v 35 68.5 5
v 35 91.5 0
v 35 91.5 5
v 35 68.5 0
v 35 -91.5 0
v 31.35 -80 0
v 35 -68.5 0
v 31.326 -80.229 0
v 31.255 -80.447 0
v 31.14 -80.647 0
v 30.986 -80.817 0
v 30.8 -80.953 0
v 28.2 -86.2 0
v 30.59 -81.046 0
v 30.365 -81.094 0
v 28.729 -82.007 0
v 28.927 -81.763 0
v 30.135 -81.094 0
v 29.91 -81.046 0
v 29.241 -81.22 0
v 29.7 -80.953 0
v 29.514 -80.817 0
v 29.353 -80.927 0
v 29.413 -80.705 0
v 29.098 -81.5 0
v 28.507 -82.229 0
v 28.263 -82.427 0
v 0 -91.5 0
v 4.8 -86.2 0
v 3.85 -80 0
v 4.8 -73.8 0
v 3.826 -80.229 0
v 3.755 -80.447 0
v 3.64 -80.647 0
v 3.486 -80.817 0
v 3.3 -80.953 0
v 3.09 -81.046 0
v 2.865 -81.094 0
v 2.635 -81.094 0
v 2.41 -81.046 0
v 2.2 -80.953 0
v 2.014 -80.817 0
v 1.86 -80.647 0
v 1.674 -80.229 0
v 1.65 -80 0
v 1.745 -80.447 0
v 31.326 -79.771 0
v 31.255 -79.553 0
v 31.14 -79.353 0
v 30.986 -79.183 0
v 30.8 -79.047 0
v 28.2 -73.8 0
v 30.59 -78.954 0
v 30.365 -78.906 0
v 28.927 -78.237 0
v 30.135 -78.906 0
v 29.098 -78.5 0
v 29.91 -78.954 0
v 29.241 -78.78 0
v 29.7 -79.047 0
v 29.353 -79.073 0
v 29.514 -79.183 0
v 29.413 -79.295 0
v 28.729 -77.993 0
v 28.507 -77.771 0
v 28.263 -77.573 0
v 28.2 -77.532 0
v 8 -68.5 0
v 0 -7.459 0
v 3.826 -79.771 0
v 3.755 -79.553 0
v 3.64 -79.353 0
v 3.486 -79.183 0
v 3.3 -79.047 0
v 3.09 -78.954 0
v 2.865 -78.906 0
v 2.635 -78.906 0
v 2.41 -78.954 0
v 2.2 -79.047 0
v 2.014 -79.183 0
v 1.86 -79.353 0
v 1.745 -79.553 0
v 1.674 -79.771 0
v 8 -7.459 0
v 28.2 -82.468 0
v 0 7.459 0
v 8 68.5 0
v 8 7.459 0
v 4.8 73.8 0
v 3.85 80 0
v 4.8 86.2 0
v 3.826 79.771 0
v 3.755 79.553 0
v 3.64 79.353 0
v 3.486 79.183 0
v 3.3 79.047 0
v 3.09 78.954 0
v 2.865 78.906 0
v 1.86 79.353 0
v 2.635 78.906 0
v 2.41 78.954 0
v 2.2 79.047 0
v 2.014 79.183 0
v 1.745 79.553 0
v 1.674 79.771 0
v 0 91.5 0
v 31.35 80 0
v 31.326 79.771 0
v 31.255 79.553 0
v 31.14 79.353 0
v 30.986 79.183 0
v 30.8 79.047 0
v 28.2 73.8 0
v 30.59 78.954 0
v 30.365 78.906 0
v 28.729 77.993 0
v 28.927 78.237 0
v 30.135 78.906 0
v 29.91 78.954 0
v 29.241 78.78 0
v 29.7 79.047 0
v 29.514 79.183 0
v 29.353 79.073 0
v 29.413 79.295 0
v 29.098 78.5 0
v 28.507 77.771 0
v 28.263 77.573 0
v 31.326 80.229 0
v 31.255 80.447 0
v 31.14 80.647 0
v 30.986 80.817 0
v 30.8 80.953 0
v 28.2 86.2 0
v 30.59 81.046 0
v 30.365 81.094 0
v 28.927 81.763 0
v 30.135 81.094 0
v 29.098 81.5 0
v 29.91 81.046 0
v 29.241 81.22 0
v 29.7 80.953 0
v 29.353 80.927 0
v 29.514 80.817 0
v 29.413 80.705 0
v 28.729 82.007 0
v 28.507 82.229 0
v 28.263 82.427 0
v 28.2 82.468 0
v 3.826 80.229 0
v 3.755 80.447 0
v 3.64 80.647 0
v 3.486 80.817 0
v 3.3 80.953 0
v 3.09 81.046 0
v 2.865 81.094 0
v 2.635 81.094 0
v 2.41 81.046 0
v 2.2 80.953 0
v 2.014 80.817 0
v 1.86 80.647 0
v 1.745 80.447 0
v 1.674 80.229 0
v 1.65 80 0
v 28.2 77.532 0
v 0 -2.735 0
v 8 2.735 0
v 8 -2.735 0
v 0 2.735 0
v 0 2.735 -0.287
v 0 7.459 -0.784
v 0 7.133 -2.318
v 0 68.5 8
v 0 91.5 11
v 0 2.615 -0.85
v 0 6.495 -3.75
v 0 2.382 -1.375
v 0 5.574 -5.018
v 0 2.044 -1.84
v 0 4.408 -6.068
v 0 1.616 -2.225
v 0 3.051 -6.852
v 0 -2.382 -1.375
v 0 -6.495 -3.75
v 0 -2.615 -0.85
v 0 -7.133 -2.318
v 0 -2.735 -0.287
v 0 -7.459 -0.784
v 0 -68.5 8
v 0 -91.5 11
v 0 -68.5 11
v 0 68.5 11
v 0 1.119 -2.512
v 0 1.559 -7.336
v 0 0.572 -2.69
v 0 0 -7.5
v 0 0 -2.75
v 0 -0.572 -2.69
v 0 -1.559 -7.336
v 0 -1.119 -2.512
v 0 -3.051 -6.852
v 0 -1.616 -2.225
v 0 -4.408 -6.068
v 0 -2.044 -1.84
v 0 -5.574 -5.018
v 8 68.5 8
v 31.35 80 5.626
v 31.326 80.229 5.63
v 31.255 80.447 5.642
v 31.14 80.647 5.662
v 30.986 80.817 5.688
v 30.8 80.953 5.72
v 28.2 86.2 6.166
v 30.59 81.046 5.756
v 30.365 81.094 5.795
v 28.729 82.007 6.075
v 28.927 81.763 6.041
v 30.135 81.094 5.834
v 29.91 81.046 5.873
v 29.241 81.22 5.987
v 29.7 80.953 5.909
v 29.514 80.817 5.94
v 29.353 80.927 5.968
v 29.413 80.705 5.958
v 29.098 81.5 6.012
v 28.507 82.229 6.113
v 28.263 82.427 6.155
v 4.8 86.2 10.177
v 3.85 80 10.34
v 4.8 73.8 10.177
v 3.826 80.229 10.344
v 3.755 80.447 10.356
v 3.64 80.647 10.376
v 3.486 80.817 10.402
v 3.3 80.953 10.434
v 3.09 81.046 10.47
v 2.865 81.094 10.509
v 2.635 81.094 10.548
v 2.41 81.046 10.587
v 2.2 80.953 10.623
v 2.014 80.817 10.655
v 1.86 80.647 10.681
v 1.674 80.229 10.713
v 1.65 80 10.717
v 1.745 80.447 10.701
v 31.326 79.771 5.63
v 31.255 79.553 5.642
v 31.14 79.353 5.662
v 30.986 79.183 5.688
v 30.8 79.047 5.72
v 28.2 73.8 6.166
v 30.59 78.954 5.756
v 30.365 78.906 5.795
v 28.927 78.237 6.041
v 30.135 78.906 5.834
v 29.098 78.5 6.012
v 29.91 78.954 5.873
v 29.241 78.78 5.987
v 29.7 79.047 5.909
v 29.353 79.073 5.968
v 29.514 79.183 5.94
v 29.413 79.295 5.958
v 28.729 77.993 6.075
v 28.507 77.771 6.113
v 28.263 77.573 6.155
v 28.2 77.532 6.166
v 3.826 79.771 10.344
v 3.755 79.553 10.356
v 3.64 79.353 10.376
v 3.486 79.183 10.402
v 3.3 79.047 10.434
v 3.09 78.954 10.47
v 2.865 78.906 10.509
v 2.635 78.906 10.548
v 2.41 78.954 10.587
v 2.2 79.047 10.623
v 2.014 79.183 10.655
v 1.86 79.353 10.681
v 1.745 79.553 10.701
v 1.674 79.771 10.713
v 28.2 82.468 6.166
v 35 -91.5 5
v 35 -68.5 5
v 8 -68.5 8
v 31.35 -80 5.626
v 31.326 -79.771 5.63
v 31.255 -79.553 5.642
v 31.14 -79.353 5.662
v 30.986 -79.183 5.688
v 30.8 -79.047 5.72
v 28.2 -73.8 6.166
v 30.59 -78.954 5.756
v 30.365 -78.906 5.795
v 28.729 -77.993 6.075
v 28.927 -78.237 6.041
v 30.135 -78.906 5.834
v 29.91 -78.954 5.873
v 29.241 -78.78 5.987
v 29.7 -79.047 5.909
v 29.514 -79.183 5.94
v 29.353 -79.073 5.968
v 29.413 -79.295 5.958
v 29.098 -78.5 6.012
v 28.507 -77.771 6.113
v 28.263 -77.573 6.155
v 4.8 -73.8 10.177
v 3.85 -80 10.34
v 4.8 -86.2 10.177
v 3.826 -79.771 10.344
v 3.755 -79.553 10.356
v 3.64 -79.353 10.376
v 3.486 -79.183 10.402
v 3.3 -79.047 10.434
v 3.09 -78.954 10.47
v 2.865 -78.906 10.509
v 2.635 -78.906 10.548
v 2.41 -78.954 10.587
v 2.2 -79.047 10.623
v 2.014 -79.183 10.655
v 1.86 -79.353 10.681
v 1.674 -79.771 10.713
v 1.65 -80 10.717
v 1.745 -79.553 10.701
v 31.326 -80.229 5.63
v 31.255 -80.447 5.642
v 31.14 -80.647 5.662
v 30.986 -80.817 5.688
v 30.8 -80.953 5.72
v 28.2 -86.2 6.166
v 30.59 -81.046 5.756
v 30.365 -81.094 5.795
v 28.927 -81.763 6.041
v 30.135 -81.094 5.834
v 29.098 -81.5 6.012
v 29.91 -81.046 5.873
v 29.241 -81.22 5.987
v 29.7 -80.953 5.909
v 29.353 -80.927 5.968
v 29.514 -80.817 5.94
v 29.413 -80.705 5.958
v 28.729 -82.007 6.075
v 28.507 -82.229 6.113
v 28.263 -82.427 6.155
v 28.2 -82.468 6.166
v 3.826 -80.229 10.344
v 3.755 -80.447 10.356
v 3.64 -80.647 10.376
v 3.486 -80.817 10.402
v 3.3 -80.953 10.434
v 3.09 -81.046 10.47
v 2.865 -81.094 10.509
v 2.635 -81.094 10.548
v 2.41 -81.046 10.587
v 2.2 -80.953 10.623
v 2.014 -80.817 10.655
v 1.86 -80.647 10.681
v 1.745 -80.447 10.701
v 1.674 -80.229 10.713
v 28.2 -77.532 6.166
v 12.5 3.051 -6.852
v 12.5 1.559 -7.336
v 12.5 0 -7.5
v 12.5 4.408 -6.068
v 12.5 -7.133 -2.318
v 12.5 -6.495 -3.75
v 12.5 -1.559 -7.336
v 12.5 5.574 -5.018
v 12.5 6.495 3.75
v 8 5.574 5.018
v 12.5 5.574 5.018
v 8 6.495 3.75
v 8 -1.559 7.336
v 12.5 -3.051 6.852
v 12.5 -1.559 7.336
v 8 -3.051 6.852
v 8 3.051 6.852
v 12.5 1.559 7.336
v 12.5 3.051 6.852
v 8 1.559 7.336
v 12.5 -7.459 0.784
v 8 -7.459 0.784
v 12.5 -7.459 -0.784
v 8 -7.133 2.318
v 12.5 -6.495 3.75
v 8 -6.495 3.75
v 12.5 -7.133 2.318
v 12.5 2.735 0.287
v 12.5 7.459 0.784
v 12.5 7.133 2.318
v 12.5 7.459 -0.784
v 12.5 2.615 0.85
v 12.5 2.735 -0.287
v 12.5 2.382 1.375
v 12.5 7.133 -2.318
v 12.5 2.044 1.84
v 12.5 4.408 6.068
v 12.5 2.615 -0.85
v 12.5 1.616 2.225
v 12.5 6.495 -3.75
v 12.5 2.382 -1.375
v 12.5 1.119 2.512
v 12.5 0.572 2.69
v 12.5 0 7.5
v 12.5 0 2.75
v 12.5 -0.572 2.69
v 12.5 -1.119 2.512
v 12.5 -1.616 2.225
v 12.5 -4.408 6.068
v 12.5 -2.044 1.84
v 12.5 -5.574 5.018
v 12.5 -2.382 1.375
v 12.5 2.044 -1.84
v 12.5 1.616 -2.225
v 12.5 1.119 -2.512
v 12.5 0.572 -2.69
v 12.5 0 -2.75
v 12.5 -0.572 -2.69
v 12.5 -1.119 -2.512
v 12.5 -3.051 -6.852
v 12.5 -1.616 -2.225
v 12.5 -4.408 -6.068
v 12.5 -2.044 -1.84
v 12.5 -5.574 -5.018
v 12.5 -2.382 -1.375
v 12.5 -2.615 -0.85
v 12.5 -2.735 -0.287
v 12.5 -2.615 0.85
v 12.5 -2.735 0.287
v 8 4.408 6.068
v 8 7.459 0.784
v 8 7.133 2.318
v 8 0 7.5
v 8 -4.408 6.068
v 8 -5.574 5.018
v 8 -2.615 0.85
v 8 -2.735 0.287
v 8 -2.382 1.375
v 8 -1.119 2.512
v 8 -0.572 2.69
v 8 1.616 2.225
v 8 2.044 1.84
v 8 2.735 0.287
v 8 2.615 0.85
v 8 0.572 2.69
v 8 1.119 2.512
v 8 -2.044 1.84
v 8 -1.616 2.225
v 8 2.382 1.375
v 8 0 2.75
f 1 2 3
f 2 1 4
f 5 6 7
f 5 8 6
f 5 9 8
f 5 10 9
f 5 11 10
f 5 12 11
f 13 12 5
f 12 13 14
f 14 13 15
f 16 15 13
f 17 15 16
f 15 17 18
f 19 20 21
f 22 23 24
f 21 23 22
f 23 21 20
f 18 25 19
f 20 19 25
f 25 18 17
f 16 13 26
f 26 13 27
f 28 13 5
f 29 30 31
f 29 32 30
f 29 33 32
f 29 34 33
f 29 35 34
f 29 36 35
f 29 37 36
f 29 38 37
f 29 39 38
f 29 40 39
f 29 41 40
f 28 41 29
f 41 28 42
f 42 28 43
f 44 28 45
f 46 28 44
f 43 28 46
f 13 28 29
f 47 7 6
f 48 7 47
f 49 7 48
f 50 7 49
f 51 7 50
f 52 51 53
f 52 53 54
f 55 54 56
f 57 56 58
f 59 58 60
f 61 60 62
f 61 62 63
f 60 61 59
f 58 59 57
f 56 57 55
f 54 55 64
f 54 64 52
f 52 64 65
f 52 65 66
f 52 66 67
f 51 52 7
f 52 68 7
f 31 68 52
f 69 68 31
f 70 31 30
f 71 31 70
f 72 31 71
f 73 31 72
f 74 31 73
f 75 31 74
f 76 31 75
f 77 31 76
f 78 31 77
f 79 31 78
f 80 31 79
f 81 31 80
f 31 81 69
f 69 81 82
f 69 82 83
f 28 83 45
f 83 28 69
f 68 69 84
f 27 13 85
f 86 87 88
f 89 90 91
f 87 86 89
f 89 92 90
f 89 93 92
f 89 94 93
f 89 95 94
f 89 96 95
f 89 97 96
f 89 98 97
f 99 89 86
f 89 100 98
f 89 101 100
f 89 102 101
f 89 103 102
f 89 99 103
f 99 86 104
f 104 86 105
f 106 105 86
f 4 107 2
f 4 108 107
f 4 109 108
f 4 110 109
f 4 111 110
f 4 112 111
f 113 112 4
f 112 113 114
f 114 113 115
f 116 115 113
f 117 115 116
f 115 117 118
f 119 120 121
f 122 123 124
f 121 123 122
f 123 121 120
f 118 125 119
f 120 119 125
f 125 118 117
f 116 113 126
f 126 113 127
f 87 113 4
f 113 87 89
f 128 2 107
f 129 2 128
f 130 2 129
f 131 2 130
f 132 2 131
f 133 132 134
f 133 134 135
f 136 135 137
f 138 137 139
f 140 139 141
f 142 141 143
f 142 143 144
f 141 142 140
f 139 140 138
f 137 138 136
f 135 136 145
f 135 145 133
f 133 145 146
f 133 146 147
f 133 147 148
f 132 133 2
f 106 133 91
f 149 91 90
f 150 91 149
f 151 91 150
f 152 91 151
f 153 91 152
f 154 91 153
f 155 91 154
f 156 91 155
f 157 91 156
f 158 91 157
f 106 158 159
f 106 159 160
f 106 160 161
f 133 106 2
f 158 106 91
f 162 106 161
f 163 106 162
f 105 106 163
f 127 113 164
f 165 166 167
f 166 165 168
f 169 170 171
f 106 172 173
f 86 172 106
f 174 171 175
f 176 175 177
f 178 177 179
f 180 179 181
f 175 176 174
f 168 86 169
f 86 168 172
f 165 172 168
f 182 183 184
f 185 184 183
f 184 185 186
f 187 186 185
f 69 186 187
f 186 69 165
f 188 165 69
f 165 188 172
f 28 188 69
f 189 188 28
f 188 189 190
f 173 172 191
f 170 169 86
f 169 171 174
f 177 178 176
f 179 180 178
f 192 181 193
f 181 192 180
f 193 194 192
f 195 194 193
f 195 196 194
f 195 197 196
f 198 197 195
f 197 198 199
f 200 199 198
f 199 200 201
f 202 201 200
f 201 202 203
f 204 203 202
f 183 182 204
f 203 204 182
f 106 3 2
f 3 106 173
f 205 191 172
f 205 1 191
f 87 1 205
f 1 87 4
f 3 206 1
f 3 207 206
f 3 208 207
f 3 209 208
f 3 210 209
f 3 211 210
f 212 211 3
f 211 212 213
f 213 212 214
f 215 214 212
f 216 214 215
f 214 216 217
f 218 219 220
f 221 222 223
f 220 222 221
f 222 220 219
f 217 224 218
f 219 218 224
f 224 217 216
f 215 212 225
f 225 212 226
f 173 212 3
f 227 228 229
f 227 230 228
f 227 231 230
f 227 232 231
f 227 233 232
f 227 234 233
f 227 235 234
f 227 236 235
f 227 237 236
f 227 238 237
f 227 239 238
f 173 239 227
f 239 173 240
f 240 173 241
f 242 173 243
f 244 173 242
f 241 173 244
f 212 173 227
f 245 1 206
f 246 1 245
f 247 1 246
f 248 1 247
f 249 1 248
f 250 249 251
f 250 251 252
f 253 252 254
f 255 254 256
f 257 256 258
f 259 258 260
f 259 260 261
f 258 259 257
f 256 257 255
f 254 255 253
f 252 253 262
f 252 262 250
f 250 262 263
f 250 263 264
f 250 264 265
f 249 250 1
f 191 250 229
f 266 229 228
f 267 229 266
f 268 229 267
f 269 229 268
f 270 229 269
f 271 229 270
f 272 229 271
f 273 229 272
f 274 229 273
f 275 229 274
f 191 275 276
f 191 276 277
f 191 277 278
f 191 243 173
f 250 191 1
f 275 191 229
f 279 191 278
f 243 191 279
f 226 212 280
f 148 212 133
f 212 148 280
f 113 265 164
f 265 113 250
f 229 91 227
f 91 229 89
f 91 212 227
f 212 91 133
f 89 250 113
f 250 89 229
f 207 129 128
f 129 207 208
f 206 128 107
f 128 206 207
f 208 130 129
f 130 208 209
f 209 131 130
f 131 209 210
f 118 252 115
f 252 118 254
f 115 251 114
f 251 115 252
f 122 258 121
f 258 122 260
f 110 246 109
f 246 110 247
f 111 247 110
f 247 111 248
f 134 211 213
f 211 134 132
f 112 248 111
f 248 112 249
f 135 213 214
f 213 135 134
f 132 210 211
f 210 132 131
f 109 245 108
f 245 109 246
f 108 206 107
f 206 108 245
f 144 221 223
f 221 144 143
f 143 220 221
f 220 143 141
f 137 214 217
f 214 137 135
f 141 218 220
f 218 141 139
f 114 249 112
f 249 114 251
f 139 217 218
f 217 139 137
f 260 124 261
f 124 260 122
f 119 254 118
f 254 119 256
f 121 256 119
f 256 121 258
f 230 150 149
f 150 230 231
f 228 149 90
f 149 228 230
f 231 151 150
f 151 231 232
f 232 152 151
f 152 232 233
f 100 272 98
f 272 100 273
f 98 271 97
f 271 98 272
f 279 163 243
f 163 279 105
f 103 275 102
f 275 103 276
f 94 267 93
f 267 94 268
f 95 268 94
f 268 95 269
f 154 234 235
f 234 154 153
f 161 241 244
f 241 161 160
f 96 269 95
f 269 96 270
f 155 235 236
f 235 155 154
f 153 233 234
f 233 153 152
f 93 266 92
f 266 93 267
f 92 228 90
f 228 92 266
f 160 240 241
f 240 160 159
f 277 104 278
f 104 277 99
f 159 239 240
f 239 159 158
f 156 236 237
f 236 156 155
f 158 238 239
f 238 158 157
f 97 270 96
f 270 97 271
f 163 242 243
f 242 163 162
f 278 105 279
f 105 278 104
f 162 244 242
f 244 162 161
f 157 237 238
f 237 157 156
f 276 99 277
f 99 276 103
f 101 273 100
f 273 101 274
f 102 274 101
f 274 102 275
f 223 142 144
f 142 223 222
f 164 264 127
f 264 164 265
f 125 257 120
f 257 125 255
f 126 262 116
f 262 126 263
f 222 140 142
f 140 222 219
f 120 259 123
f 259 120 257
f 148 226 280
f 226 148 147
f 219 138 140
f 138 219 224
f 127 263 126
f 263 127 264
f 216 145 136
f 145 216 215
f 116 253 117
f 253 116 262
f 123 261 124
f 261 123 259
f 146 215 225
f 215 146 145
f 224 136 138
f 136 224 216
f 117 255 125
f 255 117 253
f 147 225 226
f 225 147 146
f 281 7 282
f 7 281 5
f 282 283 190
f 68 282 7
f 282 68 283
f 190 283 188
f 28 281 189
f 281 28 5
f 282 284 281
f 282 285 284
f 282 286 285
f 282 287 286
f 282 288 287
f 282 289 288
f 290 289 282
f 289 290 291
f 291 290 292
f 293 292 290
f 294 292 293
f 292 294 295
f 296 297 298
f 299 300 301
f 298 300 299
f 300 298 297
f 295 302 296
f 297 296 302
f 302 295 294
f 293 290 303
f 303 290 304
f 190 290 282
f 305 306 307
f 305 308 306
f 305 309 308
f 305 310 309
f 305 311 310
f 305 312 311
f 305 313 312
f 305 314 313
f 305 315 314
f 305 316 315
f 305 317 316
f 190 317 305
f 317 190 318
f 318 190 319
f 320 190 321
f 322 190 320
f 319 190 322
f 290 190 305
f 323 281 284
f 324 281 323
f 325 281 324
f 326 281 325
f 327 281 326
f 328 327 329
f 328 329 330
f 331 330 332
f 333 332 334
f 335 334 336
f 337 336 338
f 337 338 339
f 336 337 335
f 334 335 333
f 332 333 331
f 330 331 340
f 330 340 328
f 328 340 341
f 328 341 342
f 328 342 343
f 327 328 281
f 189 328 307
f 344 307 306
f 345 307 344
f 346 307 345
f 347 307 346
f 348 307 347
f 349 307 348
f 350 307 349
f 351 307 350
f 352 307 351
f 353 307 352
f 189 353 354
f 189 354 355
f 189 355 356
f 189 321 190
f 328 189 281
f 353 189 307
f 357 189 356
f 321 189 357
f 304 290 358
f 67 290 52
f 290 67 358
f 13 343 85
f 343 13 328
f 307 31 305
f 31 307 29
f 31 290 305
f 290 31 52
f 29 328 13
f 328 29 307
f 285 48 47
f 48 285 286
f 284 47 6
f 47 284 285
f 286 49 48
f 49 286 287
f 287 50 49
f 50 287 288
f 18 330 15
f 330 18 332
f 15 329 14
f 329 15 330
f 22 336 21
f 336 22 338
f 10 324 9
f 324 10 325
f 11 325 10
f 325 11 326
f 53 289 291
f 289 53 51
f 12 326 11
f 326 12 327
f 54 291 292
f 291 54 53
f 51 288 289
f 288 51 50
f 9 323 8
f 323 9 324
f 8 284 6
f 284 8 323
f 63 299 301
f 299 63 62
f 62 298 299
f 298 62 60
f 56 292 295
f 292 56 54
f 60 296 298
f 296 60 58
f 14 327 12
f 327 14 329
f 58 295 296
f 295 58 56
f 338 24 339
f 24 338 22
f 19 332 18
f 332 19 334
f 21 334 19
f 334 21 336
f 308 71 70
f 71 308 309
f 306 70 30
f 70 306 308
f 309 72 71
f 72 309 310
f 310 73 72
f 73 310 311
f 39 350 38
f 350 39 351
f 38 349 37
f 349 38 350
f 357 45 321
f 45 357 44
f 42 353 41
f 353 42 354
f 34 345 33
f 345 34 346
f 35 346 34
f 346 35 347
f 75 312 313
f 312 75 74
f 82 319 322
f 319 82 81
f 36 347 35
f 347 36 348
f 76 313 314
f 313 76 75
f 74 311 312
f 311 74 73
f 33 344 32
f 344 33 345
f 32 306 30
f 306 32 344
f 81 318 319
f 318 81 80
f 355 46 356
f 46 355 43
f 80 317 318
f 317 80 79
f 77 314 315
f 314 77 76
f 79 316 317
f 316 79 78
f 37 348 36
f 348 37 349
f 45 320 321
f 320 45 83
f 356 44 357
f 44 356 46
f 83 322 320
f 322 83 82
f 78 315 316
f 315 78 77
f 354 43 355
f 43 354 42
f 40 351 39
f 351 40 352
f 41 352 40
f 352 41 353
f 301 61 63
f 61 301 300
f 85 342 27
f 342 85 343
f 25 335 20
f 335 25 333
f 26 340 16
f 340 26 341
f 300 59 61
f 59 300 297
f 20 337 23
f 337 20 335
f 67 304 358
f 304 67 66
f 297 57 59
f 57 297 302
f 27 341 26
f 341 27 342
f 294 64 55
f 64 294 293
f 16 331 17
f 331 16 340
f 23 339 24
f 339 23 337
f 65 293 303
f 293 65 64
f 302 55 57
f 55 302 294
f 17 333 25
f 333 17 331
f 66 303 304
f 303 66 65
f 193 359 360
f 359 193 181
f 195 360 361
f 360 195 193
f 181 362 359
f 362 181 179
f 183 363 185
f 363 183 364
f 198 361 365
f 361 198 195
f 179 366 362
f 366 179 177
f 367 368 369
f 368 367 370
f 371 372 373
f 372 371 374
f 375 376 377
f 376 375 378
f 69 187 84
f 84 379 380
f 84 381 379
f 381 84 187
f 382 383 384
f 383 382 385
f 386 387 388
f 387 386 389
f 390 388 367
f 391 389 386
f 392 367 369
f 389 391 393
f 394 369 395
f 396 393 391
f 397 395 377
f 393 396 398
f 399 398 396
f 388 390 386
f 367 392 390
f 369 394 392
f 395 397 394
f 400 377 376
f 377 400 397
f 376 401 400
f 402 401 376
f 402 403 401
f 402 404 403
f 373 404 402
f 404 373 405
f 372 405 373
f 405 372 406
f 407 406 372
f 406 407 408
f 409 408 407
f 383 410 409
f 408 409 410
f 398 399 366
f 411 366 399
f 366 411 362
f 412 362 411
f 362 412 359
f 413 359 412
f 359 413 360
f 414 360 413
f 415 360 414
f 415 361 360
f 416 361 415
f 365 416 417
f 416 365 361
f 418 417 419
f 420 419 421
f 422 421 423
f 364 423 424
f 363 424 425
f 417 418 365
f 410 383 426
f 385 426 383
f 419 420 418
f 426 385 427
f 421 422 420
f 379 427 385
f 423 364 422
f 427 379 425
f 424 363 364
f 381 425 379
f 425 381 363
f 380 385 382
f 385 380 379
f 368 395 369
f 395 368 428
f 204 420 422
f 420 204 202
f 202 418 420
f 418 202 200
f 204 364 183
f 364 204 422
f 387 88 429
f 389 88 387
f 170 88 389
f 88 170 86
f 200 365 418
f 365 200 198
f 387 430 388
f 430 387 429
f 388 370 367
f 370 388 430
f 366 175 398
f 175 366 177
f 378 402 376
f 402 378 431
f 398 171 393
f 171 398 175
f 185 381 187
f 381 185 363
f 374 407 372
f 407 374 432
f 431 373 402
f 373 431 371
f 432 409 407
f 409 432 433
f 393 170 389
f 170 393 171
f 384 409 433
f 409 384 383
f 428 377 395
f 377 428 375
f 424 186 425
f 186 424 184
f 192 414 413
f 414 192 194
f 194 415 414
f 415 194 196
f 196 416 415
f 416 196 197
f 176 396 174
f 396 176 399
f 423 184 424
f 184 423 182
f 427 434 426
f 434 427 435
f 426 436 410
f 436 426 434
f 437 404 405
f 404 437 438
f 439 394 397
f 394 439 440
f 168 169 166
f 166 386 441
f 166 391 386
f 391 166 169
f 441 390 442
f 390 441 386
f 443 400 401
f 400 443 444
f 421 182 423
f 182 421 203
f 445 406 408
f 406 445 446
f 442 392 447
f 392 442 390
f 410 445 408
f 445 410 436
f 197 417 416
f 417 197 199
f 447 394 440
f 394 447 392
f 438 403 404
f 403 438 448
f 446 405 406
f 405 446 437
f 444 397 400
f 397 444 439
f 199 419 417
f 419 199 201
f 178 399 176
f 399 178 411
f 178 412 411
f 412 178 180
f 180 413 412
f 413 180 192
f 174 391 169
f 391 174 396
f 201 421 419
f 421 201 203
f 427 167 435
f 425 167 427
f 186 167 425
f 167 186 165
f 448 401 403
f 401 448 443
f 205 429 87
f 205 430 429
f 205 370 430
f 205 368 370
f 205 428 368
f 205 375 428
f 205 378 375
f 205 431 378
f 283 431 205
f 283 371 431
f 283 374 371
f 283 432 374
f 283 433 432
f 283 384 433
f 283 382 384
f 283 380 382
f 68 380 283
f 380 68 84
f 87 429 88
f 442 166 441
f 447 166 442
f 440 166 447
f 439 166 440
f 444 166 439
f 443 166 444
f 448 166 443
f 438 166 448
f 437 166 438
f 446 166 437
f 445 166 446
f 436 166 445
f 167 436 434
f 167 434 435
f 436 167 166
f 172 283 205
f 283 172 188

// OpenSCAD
$fn=30;

translate([16.5,80,0])servo_bracket();
translate([16.5,-80,0])servo_bracket();

rotate([0,90,0])
difference(){
cylinder(d=15,h=12.5);
translate([0,0,-1])cylinder(d=5.5,h=14);
}

translate([4,0,4])cube([8,140,8],center=true);

module servo_bracket(){
difference(){
union(){
translate([1,0,2.5])cube([35,23,5],center=true);
translate([0,11.5,3])
rotate([90,0,0])linear_extrude(height=23)
polygon([[-16.5,0],[18.5,2],[-16.5,8]]);
translate([13.75,0,0])cylinder(d=8,h=2,$fn=60);
}
cube([23.4,12.4,50],center=true);
translate([13.75,0,-1])cylinder(d=2.2,h=50,$fn=30);
translate([-13.75,0,-1])cylinder(d=2.2,h=50,$fn=30);
translate([10,0,0])cylinder(d=6,h=12,$fn=60);
}
}
